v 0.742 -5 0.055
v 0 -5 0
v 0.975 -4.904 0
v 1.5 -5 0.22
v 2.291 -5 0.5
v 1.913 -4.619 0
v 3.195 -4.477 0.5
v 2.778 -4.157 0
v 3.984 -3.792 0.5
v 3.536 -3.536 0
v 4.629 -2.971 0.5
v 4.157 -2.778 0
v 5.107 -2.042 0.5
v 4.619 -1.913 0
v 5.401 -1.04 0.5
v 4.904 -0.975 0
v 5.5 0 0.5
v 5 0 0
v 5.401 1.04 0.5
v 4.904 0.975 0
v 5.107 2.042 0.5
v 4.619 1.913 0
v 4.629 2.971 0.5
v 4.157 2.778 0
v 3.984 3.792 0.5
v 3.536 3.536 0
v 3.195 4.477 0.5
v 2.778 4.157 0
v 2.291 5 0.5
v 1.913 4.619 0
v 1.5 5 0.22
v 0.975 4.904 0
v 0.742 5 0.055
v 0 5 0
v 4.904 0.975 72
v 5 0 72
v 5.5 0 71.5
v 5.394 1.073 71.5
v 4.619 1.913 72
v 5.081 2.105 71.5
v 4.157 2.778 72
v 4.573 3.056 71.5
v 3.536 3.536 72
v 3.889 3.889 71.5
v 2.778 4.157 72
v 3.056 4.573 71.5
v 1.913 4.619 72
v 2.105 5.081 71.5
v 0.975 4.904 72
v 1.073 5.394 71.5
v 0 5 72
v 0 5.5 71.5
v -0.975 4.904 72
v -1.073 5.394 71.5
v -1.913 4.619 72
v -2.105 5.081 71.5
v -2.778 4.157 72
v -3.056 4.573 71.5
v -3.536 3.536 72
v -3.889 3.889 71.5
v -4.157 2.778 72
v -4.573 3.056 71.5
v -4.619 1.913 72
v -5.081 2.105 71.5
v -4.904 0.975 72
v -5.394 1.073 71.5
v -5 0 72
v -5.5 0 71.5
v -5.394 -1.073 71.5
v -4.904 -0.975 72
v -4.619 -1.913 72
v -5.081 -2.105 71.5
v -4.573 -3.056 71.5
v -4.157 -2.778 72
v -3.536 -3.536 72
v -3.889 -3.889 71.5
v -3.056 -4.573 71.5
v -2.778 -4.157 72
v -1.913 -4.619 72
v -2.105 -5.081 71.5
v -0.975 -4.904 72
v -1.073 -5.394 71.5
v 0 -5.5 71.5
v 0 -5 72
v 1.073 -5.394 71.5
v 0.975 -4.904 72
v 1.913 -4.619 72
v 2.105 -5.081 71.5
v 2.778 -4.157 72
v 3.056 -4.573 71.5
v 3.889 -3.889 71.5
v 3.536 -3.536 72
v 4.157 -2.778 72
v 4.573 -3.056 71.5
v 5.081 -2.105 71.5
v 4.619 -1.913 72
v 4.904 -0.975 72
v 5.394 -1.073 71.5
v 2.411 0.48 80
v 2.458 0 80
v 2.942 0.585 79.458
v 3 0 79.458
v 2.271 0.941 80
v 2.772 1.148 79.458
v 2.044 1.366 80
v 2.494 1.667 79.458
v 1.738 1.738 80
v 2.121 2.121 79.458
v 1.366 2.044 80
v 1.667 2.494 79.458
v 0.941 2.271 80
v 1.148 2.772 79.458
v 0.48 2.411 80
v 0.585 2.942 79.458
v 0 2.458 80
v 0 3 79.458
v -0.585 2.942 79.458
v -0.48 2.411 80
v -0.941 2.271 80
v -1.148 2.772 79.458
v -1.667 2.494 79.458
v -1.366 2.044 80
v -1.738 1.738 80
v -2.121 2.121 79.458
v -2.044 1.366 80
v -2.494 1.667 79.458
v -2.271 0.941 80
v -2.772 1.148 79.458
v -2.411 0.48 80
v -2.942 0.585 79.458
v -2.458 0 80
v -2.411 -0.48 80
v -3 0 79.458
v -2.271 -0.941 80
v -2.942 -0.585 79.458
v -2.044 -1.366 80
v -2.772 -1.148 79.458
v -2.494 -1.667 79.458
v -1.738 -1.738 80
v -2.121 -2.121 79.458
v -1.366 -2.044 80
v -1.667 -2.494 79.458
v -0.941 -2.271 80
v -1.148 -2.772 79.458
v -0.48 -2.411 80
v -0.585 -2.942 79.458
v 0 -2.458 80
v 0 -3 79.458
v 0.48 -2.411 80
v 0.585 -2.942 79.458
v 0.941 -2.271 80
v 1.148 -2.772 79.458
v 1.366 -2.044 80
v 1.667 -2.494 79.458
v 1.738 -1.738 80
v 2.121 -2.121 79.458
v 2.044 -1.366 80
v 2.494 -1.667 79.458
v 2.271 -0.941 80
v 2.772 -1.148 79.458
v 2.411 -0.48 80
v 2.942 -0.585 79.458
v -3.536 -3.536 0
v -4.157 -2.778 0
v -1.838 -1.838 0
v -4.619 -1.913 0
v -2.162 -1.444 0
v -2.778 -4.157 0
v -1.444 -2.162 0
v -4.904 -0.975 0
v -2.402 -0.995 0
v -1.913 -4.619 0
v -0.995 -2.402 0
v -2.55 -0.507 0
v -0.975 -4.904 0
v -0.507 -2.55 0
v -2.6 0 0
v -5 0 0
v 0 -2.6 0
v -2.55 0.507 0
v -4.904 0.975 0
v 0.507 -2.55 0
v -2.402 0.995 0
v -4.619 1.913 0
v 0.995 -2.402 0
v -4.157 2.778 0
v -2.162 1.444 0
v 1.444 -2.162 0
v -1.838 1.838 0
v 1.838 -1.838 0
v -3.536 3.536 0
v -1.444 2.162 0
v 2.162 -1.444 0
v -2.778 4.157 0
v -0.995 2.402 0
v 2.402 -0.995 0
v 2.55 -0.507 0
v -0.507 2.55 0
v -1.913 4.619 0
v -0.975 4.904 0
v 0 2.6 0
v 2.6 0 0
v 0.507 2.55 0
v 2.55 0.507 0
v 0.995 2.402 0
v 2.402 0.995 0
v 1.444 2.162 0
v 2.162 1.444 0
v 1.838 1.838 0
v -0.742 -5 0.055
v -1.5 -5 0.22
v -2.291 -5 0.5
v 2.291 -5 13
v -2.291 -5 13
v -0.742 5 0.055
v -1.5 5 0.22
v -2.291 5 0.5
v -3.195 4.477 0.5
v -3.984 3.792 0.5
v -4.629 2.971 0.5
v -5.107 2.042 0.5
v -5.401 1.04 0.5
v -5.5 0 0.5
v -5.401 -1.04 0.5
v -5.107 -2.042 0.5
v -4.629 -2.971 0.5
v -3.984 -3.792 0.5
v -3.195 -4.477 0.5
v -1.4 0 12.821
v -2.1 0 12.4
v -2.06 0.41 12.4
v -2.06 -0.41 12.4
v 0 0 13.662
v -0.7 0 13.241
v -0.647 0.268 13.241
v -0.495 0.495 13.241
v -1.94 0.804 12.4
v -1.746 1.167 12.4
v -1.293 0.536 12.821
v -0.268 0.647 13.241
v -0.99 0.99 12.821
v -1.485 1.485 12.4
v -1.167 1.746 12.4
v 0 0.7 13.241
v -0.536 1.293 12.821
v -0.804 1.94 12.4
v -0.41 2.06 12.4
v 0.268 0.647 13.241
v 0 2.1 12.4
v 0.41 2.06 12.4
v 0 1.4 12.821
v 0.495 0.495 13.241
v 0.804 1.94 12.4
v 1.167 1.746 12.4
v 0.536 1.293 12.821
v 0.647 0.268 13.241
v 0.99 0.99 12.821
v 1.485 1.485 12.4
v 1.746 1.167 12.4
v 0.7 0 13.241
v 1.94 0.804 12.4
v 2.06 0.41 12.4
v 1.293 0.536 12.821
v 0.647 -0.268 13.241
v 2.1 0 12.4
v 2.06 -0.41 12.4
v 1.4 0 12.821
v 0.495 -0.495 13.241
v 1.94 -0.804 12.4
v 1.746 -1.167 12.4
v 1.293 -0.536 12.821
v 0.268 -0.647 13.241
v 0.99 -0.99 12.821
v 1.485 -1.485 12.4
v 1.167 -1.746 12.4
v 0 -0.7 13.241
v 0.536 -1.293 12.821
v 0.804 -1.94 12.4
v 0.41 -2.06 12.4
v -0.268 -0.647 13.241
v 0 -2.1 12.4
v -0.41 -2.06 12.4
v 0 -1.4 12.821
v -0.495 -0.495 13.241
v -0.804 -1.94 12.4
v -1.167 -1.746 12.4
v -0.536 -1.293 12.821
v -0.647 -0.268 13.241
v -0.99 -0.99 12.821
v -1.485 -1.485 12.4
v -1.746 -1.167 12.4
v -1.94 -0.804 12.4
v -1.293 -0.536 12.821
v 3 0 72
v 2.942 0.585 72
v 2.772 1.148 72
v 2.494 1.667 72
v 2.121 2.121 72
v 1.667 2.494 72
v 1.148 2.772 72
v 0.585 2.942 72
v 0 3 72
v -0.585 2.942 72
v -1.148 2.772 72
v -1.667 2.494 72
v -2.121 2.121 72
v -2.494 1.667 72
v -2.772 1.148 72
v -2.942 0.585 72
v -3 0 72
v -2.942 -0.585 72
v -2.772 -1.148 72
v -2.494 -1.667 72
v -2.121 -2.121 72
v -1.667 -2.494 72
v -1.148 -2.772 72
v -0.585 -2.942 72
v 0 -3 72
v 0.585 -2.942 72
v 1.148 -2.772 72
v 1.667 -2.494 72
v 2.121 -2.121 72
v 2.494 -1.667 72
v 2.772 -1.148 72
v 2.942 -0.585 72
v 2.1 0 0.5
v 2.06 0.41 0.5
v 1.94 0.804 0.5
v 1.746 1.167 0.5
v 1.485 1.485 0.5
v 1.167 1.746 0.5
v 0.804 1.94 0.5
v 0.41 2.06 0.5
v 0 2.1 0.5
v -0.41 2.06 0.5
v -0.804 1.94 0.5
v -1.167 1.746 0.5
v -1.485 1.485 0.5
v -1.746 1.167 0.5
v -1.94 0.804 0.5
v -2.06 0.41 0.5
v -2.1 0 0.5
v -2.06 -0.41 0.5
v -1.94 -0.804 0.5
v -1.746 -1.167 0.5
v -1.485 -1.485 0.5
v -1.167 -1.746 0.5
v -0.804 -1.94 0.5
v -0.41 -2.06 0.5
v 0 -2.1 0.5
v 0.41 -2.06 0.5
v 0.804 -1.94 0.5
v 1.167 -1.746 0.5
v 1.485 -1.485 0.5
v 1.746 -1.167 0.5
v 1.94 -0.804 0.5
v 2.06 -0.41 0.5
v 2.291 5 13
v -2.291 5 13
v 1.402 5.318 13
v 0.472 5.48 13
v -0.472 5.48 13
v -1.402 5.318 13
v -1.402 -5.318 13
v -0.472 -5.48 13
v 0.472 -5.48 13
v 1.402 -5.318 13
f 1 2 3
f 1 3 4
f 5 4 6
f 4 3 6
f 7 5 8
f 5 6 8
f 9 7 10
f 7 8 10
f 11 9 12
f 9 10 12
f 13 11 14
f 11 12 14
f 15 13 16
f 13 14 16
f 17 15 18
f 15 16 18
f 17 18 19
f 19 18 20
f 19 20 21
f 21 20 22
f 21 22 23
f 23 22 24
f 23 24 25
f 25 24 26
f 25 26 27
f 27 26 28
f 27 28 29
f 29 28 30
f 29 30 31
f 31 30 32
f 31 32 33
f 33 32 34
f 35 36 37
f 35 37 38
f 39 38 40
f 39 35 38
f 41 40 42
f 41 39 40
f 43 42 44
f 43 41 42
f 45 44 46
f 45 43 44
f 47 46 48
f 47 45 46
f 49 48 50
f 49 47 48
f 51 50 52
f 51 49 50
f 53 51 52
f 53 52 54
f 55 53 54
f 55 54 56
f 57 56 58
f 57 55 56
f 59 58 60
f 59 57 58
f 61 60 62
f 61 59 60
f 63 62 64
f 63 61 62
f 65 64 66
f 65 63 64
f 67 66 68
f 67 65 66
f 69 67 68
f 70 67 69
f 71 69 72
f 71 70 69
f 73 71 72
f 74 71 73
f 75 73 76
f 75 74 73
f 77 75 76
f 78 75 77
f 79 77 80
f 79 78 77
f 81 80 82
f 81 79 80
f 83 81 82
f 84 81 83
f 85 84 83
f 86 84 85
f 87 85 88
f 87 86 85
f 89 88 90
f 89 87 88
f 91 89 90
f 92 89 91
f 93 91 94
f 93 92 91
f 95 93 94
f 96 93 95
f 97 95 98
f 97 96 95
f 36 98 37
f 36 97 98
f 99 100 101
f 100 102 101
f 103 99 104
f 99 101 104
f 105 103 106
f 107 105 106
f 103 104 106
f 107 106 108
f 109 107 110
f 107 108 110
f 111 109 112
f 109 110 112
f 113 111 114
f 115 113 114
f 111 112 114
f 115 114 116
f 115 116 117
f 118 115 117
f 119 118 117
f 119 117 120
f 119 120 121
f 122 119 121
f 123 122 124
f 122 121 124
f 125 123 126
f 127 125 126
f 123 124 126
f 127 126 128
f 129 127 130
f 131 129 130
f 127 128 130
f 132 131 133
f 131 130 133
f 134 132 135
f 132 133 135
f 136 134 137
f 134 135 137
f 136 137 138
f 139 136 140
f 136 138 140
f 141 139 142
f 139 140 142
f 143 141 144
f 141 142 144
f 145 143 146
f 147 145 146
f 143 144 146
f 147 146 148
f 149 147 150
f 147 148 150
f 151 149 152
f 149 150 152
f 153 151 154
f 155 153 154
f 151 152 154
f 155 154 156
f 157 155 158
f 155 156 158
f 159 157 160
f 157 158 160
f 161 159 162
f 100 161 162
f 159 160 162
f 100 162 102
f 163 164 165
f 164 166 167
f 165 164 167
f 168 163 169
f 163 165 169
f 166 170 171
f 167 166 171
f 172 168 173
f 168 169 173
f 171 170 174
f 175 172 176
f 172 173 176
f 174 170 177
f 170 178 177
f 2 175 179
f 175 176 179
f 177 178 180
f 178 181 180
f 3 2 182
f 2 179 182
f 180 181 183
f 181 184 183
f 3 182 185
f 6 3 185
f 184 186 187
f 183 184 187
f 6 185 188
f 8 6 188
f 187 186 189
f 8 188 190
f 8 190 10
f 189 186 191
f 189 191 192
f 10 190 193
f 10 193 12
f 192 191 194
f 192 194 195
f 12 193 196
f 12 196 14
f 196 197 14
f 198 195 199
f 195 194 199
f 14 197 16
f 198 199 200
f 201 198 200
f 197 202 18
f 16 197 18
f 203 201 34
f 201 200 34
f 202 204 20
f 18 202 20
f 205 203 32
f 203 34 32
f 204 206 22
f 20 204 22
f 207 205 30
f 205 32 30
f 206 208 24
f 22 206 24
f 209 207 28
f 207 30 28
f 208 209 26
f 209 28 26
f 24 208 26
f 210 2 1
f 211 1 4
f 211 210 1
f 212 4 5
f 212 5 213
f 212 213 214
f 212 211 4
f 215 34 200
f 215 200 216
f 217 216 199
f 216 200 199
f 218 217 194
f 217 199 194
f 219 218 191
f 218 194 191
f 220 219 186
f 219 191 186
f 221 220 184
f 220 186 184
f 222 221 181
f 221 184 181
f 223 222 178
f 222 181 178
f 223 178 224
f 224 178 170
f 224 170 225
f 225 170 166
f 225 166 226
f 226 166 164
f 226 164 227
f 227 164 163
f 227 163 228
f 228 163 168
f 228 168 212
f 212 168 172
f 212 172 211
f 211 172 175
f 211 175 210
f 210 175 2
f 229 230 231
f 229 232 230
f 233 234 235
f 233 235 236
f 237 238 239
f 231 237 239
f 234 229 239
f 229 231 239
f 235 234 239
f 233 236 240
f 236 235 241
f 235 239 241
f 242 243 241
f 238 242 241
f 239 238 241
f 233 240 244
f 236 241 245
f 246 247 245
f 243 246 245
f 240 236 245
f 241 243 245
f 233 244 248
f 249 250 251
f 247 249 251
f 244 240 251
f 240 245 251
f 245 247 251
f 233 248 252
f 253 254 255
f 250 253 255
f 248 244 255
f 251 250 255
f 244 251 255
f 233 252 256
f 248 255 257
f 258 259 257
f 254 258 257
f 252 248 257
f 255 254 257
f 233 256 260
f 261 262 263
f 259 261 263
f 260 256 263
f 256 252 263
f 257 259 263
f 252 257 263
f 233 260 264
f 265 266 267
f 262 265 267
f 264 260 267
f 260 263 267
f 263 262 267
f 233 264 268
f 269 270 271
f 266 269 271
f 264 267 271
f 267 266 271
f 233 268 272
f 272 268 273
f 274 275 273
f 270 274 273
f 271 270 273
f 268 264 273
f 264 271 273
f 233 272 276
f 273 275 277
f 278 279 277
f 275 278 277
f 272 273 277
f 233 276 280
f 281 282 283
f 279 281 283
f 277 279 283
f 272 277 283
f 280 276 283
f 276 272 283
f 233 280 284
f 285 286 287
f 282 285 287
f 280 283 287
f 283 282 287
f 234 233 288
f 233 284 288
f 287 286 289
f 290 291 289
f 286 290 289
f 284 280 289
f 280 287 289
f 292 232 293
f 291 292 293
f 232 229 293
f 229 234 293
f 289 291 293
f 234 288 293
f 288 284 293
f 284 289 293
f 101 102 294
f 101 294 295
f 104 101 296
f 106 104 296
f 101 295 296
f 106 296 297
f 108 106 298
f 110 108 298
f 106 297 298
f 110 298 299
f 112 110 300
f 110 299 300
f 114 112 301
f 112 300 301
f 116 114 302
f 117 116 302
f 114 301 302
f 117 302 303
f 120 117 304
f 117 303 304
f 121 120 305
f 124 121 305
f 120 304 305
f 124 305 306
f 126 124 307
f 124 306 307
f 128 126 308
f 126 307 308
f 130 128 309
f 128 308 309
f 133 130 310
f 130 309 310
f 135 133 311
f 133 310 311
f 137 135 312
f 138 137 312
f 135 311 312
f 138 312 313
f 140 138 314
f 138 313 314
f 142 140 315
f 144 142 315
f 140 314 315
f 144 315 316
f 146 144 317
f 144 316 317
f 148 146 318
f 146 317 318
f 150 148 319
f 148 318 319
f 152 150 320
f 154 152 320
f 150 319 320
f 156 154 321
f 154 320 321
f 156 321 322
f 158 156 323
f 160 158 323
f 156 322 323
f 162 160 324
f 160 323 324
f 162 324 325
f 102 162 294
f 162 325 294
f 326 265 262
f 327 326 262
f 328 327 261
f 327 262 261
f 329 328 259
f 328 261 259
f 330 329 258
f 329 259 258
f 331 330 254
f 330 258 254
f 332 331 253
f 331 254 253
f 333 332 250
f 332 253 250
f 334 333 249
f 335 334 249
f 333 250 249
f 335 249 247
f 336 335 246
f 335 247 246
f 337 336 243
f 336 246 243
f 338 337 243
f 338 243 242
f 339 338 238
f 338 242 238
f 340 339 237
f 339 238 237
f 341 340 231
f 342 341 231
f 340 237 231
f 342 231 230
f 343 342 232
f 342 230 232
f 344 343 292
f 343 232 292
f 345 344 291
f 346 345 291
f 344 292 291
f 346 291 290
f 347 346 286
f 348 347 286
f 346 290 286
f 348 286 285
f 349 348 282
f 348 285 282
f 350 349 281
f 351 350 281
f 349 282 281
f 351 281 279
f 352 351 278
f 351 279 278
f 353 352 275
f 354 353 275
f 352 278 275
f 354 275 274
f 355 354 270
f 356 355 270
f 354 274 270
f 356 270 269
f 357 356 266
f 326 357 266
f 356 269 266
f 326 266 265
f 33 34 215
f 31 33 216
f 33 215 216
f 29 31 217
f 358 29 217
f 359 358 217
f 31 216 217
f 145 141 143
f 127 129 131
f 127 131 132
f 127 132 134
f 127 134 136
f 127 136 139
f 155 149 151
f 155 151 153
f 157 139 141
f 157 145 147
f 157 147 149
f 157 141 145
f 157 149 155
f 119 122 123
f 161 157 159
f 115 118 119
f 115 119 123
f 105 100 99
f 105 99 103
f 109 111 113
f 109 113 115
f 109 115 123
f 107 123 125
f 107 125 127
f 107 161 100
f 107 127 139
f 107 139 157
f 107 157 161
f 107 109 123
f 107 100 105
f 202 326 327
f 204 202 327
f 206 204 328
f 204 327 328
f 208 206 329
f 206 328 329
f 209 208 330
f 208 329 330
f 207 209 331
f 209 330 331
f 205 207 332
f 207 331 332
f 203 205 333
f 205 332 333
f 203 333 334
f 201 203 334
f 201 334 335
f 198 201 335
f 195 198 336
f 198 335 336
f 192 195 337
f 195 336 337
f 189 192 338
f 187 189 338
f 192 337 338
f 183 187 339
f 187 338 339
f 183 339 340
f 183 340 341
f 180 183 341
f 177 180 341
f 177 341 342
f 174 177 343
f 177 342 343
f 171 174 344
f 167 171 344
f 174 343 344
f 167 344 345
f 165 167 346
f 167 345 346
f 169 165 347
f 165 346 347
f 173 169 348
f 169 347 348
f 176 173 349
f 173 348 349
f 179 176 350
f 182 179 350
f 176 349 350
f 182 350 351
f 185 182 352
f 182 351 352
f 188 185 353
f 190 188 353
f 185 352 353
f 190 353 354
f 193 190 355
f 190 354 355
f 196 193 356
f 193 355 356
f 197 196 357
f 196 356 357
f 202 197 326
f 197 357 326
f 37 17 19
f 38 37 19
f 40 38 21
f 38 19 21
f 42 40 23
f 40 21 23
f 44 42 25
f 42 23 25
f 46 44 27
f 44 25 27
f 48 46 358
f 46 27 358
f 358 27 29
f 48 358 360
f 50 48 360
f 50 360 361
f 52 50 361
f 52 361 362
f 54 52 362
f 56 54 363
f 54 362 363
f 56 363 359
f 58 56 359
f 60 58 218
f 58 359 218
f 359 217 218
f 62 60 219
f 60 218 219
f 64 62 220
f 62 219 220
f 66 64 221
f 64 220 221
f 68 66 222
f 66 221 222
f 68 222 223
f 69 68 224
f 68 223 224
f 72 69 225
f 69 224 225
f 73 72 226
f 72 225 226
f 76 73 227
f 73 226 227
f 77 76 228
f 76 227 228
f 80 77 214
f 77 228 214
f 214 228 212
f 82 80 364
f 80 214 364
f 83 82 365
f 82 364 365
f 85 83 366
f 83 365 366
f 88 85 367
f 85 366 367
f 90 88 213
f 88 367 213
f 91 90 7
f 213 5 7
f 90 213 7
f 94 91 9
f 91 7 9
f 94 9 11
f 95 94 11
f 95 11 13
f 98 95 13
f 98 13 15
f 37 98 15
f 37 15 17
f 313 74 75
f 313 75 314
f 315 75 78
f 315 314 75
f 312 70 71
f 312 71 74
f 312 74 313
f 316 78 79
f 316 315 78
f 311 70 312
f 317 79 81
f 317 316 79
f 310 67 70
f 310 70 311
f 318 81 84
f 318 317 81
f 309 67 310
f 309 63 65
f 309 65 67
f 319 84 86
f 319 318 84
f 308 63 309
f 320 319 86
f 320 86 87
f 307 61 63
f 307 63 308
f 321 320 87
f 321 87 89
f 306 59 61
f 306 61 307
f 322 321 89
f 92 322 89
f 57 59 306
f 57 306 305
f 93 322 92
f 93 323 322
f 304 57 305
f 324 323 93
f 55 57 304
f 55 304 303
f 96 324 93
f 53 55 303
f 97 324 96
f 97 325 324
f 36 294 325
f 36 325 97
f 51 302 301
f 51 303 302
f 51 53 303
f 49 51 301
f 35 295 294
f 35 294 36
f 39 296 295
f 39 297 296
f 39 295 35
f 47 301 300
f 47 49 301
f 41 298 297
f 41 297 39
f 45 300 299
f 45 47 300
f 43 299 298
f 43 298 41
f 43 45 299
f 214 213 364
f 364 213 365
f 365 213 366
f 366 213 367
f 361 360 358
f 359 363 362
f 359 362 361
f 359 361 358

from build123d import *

# Parameters (mm, degrees)
SKETCH_1_R             = 5.5
EXTRUDE_1_DEPTH        = 72
CHAMFER_1_SIZE         = 0.5
SKETCH_2_R             = 3.3
EXTRUDE_2_DEPTH        = 8
HOLE_WIZARD_M5_1_D     = 4.2
HOLE_WIZARD_M5_1_DEPTH = 12.4
HOLE_WIZARD_M5_1_TIP   = 1.2618073
CHAMFER_3_SIZE         = 0.5
SKETCH_6_W             = 10
SKETCH_6_H             = 3
CUT_EXTRUDE_1_DEPTH    = 13


# Read off the part's stored shape, not the designer's step: M6 机械螺纹 螺柱1
with BuildPart() as part:
    # 草图1 → 拉伸1 (new body)
    with BuildSketch(Plane.XY):
        Circle(SKETCH_1_R)
    extrude(amount=EXTRUDE_1_DEPTH)

    # 倒角1
    chamfer_1_edges = [part.edges().sort_by_distance(p)[0] for p in [
        (-5.5, 0, 0),
        (-5.5, 0, 72),
    ]]
    chamfer(chamfer_1_edges, length=CHAMFER_1_SIZE)

    # 草图2 → 拉伸2 (add)
    with BuildSketch(Plane.XY.offset(72)):
        Circle(SKETCH_2_R)
    extrude(amount=EXTRUDE_2_DEPTH)

    # M5 螺纹孔1
    with Locations(Plane(origin=(0, 0, 0), x_dir=(-1, 0, 0), z_dir=(0, 0, -1))):
        with Locations((0, 0)):
            Hole(HOLE_WIZARD_M5_1_D / 2, depth=HOLE_WIZARD_M5_1_DEPTH)
            with Locations((0, 0, -(HOLE_WIZARD_M5_1_DEPTH + HOLE_WIZARD_M5_1_TIP / 2))):  # 118° drill point
                Cone(0, HOLE_WIZARD_M5_1_D / 2, HOLE_WIZARD_M5_1_TIP, mode=Mode.SUBTRACT)

    # 倒角3
    chamfer_3_edges = [part.edges().sort_by_distance(p)[0] for p in [
        (-2.1, 0, 0),
    ]]
    chamfer(chamfer_3_edges, length=CHAMFER_3_SIZE)

    # 草图6 → 切除-拉伸1 (cut)
    with BuildSketch(Plane(origin=(0, 0, 0), x_dir=(-1, 0, 0), z_dir=(0, 0, -1))):
        with Locations((0, 6.5)):
            Rectangle(SKETCH_6_W, SKETCH_6_H)
        with Locations((0, -6.5)):
            Rectangle(SKETCH_6_W, SKETCH_6_H)
    extrude(amount=-CUT_EXTRUDE_1_DEPTH, mode=Mode.SUBTRACT)

    # M6 机械螺纹 螺柱1 outline → M6 机械螺纹 螺柱1 (revolve, cut)
    with BuildSketch(Plane.XZ):
        Polygon((3.3, 80), (2.4585, 80), (3, 79.4585), (3, 72), (3.3, 72), align=None)
    revolve(axis=Axis((0, 0, 0), (0, 0, 1)), mode=Mode.SUBTRACT)


solid = part.part
